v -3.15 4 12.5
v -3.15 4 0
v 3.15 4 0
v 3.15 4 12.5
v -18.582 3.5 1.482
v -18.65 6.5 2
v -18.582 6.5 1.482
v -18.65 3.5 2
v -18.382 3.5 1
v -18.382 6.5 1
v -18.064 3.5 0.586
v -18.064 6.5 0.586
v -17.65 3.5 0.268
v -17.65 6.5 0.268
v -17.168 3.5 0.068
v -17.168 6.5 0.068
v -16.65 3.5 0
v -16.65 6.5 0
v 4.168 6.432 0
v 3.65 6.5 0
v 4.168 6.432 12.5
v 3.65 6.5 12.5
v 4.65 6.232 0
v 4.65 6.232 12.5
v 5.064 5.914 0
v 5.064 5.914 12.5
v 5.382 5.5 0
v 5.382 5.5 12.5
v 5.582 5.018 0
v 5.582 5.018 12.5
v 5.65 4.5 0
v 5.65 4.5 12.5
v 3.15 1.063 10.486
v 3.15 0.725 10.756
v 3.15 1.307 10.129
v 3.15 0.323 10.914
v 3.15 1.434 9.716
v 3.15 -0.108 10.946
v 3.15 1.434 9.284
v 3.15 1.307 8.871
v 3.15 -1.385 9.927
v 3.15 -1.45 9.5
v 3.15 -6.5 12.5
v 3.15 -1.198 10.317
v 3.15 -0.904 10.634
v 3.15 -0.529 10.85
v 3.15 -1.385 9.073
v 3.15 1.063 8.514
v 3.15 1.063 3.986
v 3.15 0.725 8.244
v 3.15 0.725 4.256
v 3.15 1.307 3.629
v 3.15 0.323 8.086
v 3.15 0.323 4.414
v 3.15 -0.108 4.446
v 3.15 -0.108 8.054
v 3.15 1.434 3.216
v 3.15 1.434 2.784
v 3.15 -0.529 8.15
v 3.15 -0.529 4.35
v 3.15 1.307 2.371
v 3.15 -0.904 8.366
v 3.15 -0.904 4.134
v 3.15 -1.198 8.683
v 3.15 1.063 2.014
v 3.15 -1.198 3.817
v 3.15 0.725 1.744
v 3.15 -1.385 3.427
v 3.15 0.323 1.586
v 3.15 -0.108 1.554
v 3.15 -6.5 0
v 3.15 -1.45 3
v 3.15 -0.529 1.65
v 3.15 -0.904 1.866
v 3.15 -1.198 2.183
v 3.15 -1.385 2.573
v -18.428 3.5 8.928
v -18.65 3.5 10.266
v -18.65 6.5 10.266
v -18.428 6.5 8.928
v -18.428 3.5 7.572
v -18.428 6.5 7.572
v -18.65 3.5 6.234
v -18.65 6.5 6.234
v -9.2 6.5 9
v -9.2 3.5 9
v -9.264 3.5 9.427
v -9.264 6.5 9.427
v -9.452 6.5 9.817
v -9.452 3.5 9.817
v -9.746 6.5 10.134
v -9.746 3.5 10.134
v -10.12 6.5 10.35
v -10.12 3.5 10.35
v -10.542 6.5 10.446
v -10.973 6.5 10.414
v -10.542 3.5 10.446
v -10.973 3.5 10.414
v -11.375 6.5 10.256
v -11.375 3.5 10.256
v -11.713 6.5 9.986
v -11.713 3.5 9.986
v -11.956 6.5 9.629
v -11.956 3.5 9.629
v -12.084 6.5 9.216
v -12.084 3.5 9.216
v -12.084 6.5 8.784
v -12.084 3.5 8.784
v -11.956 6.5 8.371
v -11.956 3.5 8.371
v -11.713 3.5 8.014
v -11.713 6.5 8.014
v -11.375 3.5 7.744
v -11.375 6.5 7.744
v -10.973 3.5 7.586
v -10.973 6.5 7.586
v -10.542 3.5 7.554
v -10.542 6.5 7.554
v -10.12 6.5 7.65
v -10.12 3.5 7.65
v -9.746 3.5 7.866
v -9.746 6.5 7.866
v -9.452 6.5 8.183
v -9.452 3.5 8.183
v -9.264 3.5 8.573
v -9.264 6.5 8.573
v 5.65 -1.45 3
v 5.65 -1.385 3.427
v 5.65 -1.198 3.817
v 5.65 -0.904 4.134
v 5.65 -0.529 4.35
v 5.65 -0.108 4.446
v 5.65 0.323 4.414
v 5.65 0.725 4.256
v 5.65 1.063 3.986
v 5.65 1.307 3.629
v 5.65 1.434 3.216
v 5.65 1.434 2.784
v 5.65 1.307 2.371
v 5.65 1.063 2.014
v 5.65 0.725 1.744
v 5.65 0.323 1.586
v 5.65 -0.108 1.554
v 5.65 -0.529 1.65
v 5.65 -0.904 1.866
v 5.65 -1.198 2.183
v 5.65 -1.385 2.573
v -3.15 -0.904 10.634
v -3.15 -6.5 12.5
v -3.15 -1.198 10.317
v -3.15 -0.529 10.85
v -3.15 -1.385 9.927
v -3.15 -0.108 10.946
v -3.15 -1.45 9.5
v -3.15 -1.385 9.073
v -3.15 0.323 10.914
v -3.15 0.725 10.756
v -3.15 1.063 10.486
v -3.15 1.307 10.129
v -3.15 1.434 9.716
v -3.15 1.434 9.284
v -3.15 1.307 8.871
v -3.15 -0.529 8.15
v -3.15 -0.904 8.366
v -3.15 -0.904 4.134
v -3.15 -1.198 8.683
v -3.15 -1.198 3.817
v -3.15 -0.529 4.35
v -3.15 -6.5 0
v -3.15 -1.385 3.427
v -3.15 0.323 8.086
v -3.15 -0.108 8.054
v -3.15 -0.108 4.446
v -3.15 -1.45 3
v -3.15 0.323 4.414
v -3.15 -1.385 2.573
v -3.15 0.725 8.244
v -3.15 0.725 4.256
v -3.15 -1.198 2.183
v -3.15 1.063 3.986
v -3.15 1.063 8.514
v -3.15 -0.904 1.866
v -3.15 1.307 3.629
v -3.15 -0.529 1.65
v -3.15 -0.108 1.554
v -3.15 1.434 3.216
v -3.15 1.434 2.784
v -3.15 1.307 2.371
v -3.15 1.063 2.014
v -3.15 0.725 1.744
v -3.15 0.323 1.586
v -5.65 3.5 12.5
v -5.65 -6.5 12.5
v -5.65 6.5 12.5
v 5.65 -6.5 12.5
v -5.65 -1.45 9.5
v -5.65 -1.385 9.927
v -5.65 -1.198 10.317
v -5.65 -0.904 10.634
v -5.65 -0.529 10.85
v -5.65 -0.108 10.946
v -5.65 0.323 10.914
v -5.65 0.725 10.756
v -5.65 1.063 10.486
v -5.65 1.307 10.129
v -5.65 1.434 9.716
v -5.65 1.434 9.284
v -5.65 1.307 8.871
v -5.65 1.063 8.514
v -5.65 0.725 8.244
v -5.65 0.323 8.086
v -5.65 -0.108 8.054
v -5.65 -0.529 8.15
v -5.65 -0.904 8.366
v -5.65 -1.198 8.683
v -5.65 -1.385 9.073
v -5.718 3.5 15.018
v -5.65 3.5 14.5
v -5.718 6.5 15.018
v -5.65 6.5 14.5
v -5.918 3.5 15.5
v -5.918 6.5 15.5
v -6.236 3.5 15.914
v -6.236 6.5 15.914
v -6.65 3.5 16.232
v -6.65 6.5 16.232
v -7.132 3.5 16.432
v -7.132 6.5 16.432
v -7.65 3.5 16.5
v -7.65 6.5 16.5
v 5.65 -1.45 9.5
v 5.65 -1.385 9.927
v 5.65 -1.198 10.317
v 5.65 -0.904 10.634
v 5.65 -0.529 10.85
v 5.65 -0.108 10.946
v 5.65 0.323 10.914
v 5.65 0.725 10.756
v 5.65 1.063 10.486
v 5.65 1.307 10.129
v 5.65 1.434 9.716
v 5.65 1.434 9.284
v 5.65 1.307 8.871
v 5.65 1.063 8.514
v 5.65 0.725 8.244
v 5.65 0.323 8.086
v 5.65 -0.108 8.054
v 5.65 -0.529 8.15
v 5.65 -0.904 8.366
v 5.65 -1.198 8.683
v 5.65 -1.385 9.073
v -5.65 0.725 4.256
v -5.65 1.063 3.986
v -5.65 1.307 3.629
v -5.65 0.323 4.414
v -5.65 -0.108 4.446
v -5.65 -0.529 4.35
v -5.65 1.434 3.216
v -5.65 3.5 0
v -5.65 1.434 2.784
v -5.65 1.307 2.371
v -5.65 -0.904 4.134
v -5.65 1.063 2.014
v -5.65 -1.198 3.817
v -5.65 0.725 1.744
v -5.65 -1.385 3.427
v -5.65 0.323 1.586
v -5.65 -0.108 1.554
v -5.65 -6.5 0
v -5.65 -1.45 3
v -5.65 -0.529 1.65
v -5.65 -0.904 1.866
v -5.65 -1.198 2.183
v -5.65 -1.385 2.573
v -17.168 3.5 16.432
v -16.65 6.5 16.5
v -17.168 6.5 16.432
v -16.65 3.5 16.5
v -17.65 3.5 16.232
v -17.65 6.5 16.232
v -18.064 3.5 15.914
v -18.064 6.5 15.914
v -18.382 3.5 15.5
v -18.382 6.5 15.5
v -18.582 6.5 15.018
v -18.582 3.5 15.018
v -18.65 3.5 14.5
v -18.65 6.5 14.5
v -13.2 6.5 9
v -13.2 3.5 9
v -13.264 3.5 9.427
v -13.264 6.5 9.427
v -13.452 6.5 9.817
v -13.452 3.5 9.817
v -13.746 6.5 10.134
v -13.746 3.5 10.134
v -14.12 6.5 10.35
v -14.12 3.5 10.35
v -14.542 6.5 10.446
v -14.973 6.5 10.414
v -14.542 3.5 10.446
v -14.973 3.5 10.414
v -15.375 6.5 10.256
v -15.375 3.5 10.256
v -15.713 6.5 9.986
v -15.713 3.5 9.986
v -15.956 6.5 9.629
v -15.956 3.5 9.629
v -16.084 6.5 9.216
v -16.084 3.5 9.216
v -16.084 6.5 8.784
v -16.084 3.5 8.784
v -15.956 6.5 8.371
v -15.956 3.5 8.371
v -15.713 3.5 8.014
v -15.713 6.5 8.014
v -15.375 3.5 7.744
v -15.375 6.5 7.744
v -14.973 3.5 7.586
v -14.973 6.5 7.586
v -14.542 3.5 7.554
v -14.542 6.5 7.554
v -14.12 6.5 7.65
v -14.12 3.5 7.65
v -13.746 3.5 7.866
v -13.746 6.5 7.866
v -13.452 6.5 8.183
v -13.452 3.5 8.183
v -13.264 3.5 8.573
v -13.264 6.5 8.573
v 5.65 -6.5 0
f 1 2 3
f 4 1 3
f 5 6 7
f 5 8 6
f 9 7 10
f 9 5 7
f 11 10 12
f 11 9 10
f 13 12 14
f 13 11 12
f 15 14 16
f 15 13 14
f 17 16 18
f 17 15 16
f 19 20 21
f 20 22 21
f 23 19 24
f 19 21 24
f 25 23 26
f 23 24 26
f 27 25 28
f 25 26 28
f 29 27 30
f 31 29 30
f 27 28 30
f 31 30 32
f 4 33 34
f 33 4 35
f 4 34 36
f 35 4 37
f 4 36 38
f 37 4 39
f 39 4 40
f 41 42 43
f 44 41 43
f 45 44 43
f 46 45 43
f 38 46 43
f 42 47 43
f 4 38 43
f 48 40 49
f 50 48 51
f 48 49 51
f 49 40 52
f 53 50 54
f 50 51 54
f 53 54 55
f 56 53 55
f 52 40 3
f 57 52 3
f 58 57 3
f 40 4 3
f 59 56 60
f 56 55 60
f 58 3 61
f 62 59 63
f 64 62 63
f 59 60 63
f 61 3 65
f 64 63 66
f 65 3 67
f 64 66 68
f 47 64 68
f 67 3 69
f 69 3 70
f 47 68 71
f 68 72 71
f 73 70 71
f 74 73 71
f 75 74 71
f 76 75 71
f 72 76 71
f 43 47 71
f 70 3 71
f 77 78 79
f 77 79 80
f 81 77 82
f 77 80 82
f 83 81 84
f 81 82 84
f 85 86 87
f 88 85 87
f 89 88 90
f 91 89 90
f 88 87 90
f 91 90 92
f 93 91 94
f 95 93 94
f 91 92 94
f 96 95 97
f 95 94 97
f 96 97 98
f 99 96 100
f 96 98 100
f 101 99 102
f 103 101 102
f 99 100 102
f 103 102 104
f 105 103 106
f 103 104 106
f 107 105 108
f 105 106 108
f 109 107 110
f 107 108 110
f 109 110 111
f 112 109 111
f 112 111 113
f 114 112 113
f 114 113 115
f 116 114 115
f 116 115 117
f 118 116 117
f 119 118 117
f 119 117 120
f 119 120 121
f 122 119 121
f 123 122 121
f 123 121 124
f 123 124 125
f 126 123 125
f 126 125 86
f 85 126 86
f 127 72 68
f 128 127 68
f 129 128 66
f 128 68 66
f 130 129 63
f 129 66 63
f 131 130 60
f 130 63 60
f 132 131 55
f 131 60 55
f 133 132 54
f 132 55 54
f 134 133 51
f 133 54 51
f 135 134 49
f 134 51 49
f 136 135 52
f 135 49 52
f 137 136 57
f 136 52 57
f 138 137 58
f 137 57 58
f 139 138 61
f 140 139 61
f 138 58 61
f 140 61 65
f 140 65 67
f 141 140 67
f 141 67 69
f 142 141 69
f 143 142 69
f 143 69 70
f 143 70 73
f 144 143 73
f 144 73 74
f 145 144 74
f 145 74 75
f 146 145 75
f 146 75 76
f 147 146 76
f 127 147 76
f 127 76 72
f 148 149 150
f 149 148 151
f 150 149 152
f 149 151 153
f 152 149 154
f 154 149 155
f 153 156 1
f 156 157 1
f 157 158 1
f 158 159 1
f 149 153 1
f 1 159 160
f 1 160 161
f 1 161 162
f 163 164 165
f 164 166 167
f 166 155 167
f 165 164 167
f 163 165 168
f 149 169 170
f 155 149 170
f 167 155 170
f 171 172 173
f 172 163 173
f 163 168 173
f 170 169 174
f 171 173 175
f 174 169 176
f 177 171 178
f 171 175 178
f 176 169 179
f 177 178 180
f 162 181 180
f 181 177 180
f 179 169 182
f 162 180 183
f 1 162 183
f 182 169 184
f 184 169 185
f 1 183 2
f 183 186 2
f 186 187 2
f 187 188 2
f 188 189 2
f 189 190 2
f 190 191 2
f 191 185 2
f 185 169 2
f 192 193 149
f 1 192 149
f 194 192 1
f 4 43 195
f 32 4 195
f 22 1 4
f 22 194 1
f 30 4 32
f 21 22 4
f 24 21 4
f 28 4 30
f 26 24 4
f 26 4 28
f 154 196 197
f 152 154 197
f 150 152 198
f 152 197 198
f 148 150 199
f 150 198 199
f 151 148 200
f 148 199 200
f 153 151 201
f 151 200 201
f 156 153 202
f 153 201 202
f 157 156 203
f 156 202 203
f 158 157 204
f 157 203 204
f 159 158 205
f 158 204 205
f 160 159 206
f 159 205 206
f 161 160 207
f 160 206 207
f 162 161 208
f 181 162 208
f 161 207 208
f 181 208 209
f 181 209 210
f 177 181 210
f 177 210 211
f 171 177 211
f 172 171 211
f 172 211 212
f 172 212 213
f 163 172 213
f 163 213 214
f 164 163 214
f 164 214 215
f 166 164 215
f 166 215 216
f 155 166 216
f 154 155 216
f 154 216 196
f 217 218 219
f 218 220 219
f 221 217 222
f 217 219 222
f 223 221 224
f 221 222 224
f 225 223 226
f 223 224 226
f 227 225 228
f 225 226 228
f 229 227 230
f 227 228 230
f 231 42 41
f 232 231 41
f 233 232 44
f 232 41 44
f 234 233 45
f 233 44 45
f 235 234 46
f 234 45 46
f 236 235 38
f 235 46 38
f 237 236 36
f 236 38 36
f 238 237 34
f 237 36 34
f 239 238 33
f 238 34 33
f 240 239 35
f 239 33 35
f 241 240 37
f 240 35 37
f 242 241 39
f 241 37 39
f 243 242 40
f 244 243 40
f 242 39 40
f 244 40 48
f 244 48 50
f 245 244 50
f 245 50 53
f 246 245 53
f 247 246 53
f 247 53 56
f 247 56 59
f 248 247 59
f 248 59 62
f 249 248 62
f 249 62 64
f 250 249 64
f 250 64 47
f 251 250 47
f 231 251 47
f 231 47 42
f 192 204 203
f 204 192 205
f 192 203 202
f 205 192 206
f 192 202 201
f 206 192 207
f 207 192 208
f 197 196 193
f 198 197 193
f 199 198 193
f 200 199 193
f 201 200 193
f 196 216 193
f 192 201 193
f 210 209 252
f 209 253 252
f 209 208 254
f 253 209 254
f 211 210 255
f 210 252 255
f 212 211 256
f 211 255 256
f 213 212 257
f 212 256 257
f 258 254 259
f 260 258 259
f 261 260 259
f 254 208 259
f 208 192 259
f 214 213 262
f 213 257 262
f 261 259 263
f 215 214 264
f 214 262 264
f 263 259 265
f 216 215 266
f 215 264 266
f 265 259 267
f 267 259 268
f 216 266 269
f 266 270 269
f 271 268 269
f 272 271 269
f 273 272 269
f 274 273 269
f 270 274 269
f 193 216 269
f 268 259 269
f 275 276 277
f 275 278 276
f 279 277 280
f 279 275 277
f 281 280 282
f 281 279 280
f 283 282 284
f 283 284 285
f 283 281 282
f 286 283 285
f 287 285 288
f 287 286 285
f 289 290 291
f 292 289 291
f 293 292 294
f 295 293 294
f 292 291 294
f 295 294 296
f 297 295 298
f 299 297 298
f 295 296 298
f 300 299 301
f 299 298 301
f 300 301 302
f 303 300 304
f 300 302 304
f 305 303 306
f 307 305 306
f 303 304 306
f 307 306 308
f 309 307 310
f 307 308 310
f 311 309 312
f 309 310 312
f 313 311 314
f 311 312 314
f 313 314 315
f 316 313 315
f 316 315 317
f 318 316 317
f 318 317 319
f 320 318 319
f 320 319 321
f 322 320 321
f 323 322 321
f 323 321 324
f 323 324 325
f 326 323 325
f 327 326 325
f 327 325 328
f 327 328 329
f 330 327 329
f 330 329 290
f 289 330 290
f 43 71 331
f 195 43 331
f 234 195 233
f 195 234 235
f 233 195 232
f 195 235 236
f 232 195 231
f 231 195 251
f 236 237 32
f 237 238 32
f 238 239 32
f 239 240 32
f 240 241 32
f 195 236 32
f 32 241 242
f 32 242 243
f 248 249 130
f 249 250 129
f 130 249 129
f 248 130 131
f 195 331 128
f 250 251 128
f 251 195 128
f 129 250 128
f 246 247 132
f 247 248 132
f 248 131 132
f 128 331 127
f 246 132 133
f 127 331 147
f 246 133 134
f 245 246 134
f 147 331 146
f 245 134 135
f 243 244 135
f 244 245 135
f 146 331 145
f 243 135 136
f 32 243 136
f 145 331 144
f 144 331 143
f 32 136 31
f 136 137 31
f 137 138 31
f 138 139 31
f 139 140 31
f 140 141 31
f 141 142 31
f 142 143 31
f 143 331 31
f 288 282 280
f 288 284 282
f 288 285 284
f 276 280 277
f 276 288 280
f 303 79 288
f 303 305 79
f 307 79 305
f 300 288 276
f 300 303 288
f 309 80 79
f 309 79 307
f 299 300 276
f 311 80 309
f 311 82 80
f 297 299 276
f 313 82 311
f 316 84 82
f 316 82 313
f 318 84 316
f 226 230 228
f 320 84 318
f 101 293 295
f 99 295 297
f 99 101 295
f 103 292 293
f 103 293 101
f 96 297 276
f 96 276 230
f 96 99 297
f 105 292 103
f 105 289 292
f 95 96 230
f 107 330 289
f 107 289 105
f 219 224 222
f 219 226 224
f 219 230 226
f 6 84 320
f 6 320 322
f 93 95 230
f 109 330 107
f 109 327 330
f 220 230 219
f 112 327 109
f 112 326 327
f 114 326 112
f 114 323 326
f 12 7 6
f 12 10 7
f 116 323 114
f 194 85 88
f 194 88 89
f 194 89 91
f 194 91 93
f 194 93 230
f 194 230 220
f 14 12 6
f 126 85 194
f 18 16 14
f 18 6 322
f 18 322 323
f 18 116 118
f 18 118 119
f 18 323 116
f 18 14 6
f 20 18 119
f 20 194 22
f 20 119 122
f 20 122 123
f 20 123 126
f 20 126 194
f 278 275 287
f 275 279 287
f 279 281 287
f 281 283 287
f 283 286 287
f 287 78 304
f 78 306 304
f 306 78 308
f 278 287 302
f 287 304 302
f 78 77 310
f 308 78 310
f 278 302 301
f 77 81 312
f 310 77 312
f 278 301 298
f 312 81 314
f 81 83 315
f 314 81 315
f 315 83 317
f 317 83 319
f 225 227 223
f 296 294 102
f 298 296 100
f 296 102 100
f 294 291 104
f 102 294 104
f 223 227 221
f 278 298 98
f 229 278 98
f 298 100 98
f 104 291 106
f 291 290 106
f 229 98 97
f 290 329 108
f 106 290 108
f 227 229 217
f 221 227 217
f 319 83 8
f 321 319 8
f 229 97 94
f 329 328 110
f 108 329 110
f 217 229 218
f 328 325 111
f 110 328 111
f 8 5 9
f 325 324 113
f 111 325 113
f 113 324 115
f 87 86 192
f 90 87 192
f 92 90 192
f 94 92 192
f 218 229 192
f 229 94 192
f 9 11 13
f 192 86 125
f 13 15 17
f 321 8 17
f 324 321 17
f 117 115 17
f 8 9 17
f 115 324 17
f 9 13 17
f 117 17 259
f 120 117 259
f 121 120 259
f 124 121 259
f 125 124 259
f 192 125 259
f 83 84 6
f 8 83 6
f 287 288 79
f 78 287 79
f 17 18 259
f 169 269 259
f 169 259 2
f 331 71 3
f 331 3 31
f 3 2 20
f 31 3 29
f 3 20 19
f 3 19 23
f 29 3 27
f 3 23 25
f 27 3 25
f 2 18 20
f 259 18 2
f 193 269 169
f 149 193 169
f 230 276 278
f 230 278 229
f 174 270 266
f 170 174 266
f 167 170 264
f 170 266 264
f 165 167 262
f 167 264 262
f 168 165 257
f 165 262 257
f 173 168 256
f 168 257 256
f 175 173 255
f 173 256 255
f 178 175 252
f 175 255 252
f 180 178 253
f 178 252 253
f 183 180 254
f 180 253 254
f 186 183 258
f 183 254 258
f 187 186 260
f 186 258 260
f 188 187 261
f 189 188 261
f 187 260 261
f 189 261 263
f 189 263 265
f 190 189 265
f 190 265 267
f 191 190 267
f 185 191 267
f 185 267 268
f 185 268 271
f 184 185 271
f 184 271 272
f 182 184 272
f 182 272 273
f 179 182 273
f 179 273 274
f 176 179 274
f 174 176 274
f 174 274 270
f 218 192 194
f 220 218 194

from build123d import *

# Parameters (mm, degrees)
F0_W      = 25
F0_H      = 3
F1_DEPTH  = 12.5
F2_W      = 25
F2_H      = 3
F3_DEPTH  = 4
F5_DEPTH  = 25
F6_DEPTH  = 15
F8_D      = 2.9
F9_DEPTH  = 25
F11_DEPTH = 25
F12_R     = 2
F13_D     = 2.9


with BuildPart() as f1:
    # F0 (on Top) → F1 (new body)
    with BuildSketch(Plane.XY):
        with Locations((-18.1500001341, 5.0000001341)):
            Rectangle(F0_W, F0_H)
        Polygon((3.15, 4), (3.15, -4), (3.15, -6.5000001341), (5.6500001341, -6.5000001341), (5.6500001341, 6.5000001341), (-5.6500001341, 6.5000001341), (-5.6500001341, 3.5000001341), (-5.6500001341, -6.5000001341), (-3.15, -6.5000001341), (-3.15, -4), (-3.15, 4), align=None)
    extrude(amount=F1_DEPTH)

    # F2 (on face) → F3 (join)
    with BuildSketch(Plane.XY.offset(12.5)):
        with Locations((-18.1500001341, 5.0000001341)):
            Rectangle(F2_W, F2_H)
    extrude(amount=F3_DEPTH)

    # F4 (on face) → F5 (cut)
    with BuildSketch(Plane(origin=(0, 6.5000001341, 0), x_dir=(-1, 0, 0), z_dir=(0, 1, 0))):
        with BuildLine():
            ThreePointArc((26.6500001341, 16.5), (28.7158126292, 16.2371721363), (30.6500001341, 15.4654348448))
            Line((30.6500001341, 15.4654348448), (30.6500001341, 16.5))
            Line((30.6500001341, 16.5), (26.6500001341, 16.5))
        make_face()
        with BuildLine():
            Line((30.6500001341, 0), (30.6500001341, 1.0345651552))
            ThreePointArc((30.6500001341, 1.0345651552), (28.7158126292, 0.2628278637), (26.6500001341, 0))
            Line((26.6500001341, 0), (30.6500001341, 0))
        make_face()
        with BuildLine():
            Line((30.6500001341, 6.1884471872), (30.6500001341, 10.3115528128))
            ThreePointArc((30.6500001341, 10.3115528128), (22.1500001341, 8.25), (30.6500001341, 6.1884471872))
        make_face()
    extrude(amount=-F5_DEPTH, mode=Mode.SUBTRACT)

    # F4 (on face) → F6 (join)
    with BuildSketch(Plane(origin=(0, 6.5000001341, 0), x_dir=(-1, 0, 0), z_dir=(0, 1, 0))):
        with BuildLine():
            ThreePointArc((30.6500001341, 6.1884471872), (22.1500001341, 8.25), (30.6500001341, 10.3115528128))
            Line((30.6500001341, 10.3115528128), (30.6500001341, 15.4654348448))
            ThreePointArc((30.6500001341, 15.4654348448), (28.7158126292, 16.2371721363), (26.6500001341, 16.5))
            ThreePointArc((26.6500001341, 16.5), (18.4000001341, 8.25), (26.6500001341, 0))
            ThreePointArc((26.6500001341, 0), (28.7158126292, 0.2628278637), (30.6500001341, 1.0345651552))
            Line((30.6500001341, 1.0345651552), (30.6500001341, 6.1884471872))
        make_face()
    extrude(amount=F6_DEPTH)

    # F8 (through all)
    with Locations(Plane.YZ.offset(5.6500001341)):
        with Locations((0.0002758615, 3), (0.0002758615, 9.5)):
            Hole(F8_D / 2)

    # F9 (cut): a face of the model
    f9_faces = [f1.faces().sort_by_distance(p)[0] for p in [
        (-30.444497701, 21.5000001341, 3.6115061712),
    ]]
    extrude(f9_faces, amount=-F9_DEPTH, mode=Mode.SUBTRACT)

    # F10 (on face) → F11 (cut)
    with BuildSketch(Plane(origin=(0, 6.5000001341, 0), x_dir=(-1, 0, 0), z_dir=(0, 1, 0))):
        with BuildLine():
            Line((18.6500001341, 16.5), (18.6500001341, 10.2655644371))
            ThreePointArc((18.6500001341, 10.2655644371), (21.5788023765, 14.7573384193), (26.6500001341, 16.5))
            Line((26.6500001341, 16.5), (18.6500001341, 16.5))
        make_face()
        with BuildLine():
            Line((18.6500001341, 6.2344355629), (18.6500001341, 0))
            Line((18.6500001341, 0), (26.6500001341, 0))
            ThreePointArc((26.6500001341, 0), (21.5788023765, 1.7426615807), (18.6500001341, 6.2344355629))
        make_face()
    extrude(amount=-F11_DEPTH, mode=Mode.SUBTRACT)

    # F12
    f12_edges = [f1.edges().sort_by_distance(p)[0] for p in [
        (-18.65, 5, 0),
        (-18.65, 5, 16.5),
        (-5.65, 5, 16.5),
        (5.65, 6.5, 6.25),
    ]]
    fillet(f12_edges, radius=F12_R)

    # F13 (through all)
    with Locations(Plane(origin=(0, 6.5000001341, 0), x_dir=(-1, 0, 0), z_dir=(0, 1, 0))):
        with Locations((14.6500001341, 9), (10.6500001341, 9)):
            Hole(F13_D / 2)


solid = f1.part
